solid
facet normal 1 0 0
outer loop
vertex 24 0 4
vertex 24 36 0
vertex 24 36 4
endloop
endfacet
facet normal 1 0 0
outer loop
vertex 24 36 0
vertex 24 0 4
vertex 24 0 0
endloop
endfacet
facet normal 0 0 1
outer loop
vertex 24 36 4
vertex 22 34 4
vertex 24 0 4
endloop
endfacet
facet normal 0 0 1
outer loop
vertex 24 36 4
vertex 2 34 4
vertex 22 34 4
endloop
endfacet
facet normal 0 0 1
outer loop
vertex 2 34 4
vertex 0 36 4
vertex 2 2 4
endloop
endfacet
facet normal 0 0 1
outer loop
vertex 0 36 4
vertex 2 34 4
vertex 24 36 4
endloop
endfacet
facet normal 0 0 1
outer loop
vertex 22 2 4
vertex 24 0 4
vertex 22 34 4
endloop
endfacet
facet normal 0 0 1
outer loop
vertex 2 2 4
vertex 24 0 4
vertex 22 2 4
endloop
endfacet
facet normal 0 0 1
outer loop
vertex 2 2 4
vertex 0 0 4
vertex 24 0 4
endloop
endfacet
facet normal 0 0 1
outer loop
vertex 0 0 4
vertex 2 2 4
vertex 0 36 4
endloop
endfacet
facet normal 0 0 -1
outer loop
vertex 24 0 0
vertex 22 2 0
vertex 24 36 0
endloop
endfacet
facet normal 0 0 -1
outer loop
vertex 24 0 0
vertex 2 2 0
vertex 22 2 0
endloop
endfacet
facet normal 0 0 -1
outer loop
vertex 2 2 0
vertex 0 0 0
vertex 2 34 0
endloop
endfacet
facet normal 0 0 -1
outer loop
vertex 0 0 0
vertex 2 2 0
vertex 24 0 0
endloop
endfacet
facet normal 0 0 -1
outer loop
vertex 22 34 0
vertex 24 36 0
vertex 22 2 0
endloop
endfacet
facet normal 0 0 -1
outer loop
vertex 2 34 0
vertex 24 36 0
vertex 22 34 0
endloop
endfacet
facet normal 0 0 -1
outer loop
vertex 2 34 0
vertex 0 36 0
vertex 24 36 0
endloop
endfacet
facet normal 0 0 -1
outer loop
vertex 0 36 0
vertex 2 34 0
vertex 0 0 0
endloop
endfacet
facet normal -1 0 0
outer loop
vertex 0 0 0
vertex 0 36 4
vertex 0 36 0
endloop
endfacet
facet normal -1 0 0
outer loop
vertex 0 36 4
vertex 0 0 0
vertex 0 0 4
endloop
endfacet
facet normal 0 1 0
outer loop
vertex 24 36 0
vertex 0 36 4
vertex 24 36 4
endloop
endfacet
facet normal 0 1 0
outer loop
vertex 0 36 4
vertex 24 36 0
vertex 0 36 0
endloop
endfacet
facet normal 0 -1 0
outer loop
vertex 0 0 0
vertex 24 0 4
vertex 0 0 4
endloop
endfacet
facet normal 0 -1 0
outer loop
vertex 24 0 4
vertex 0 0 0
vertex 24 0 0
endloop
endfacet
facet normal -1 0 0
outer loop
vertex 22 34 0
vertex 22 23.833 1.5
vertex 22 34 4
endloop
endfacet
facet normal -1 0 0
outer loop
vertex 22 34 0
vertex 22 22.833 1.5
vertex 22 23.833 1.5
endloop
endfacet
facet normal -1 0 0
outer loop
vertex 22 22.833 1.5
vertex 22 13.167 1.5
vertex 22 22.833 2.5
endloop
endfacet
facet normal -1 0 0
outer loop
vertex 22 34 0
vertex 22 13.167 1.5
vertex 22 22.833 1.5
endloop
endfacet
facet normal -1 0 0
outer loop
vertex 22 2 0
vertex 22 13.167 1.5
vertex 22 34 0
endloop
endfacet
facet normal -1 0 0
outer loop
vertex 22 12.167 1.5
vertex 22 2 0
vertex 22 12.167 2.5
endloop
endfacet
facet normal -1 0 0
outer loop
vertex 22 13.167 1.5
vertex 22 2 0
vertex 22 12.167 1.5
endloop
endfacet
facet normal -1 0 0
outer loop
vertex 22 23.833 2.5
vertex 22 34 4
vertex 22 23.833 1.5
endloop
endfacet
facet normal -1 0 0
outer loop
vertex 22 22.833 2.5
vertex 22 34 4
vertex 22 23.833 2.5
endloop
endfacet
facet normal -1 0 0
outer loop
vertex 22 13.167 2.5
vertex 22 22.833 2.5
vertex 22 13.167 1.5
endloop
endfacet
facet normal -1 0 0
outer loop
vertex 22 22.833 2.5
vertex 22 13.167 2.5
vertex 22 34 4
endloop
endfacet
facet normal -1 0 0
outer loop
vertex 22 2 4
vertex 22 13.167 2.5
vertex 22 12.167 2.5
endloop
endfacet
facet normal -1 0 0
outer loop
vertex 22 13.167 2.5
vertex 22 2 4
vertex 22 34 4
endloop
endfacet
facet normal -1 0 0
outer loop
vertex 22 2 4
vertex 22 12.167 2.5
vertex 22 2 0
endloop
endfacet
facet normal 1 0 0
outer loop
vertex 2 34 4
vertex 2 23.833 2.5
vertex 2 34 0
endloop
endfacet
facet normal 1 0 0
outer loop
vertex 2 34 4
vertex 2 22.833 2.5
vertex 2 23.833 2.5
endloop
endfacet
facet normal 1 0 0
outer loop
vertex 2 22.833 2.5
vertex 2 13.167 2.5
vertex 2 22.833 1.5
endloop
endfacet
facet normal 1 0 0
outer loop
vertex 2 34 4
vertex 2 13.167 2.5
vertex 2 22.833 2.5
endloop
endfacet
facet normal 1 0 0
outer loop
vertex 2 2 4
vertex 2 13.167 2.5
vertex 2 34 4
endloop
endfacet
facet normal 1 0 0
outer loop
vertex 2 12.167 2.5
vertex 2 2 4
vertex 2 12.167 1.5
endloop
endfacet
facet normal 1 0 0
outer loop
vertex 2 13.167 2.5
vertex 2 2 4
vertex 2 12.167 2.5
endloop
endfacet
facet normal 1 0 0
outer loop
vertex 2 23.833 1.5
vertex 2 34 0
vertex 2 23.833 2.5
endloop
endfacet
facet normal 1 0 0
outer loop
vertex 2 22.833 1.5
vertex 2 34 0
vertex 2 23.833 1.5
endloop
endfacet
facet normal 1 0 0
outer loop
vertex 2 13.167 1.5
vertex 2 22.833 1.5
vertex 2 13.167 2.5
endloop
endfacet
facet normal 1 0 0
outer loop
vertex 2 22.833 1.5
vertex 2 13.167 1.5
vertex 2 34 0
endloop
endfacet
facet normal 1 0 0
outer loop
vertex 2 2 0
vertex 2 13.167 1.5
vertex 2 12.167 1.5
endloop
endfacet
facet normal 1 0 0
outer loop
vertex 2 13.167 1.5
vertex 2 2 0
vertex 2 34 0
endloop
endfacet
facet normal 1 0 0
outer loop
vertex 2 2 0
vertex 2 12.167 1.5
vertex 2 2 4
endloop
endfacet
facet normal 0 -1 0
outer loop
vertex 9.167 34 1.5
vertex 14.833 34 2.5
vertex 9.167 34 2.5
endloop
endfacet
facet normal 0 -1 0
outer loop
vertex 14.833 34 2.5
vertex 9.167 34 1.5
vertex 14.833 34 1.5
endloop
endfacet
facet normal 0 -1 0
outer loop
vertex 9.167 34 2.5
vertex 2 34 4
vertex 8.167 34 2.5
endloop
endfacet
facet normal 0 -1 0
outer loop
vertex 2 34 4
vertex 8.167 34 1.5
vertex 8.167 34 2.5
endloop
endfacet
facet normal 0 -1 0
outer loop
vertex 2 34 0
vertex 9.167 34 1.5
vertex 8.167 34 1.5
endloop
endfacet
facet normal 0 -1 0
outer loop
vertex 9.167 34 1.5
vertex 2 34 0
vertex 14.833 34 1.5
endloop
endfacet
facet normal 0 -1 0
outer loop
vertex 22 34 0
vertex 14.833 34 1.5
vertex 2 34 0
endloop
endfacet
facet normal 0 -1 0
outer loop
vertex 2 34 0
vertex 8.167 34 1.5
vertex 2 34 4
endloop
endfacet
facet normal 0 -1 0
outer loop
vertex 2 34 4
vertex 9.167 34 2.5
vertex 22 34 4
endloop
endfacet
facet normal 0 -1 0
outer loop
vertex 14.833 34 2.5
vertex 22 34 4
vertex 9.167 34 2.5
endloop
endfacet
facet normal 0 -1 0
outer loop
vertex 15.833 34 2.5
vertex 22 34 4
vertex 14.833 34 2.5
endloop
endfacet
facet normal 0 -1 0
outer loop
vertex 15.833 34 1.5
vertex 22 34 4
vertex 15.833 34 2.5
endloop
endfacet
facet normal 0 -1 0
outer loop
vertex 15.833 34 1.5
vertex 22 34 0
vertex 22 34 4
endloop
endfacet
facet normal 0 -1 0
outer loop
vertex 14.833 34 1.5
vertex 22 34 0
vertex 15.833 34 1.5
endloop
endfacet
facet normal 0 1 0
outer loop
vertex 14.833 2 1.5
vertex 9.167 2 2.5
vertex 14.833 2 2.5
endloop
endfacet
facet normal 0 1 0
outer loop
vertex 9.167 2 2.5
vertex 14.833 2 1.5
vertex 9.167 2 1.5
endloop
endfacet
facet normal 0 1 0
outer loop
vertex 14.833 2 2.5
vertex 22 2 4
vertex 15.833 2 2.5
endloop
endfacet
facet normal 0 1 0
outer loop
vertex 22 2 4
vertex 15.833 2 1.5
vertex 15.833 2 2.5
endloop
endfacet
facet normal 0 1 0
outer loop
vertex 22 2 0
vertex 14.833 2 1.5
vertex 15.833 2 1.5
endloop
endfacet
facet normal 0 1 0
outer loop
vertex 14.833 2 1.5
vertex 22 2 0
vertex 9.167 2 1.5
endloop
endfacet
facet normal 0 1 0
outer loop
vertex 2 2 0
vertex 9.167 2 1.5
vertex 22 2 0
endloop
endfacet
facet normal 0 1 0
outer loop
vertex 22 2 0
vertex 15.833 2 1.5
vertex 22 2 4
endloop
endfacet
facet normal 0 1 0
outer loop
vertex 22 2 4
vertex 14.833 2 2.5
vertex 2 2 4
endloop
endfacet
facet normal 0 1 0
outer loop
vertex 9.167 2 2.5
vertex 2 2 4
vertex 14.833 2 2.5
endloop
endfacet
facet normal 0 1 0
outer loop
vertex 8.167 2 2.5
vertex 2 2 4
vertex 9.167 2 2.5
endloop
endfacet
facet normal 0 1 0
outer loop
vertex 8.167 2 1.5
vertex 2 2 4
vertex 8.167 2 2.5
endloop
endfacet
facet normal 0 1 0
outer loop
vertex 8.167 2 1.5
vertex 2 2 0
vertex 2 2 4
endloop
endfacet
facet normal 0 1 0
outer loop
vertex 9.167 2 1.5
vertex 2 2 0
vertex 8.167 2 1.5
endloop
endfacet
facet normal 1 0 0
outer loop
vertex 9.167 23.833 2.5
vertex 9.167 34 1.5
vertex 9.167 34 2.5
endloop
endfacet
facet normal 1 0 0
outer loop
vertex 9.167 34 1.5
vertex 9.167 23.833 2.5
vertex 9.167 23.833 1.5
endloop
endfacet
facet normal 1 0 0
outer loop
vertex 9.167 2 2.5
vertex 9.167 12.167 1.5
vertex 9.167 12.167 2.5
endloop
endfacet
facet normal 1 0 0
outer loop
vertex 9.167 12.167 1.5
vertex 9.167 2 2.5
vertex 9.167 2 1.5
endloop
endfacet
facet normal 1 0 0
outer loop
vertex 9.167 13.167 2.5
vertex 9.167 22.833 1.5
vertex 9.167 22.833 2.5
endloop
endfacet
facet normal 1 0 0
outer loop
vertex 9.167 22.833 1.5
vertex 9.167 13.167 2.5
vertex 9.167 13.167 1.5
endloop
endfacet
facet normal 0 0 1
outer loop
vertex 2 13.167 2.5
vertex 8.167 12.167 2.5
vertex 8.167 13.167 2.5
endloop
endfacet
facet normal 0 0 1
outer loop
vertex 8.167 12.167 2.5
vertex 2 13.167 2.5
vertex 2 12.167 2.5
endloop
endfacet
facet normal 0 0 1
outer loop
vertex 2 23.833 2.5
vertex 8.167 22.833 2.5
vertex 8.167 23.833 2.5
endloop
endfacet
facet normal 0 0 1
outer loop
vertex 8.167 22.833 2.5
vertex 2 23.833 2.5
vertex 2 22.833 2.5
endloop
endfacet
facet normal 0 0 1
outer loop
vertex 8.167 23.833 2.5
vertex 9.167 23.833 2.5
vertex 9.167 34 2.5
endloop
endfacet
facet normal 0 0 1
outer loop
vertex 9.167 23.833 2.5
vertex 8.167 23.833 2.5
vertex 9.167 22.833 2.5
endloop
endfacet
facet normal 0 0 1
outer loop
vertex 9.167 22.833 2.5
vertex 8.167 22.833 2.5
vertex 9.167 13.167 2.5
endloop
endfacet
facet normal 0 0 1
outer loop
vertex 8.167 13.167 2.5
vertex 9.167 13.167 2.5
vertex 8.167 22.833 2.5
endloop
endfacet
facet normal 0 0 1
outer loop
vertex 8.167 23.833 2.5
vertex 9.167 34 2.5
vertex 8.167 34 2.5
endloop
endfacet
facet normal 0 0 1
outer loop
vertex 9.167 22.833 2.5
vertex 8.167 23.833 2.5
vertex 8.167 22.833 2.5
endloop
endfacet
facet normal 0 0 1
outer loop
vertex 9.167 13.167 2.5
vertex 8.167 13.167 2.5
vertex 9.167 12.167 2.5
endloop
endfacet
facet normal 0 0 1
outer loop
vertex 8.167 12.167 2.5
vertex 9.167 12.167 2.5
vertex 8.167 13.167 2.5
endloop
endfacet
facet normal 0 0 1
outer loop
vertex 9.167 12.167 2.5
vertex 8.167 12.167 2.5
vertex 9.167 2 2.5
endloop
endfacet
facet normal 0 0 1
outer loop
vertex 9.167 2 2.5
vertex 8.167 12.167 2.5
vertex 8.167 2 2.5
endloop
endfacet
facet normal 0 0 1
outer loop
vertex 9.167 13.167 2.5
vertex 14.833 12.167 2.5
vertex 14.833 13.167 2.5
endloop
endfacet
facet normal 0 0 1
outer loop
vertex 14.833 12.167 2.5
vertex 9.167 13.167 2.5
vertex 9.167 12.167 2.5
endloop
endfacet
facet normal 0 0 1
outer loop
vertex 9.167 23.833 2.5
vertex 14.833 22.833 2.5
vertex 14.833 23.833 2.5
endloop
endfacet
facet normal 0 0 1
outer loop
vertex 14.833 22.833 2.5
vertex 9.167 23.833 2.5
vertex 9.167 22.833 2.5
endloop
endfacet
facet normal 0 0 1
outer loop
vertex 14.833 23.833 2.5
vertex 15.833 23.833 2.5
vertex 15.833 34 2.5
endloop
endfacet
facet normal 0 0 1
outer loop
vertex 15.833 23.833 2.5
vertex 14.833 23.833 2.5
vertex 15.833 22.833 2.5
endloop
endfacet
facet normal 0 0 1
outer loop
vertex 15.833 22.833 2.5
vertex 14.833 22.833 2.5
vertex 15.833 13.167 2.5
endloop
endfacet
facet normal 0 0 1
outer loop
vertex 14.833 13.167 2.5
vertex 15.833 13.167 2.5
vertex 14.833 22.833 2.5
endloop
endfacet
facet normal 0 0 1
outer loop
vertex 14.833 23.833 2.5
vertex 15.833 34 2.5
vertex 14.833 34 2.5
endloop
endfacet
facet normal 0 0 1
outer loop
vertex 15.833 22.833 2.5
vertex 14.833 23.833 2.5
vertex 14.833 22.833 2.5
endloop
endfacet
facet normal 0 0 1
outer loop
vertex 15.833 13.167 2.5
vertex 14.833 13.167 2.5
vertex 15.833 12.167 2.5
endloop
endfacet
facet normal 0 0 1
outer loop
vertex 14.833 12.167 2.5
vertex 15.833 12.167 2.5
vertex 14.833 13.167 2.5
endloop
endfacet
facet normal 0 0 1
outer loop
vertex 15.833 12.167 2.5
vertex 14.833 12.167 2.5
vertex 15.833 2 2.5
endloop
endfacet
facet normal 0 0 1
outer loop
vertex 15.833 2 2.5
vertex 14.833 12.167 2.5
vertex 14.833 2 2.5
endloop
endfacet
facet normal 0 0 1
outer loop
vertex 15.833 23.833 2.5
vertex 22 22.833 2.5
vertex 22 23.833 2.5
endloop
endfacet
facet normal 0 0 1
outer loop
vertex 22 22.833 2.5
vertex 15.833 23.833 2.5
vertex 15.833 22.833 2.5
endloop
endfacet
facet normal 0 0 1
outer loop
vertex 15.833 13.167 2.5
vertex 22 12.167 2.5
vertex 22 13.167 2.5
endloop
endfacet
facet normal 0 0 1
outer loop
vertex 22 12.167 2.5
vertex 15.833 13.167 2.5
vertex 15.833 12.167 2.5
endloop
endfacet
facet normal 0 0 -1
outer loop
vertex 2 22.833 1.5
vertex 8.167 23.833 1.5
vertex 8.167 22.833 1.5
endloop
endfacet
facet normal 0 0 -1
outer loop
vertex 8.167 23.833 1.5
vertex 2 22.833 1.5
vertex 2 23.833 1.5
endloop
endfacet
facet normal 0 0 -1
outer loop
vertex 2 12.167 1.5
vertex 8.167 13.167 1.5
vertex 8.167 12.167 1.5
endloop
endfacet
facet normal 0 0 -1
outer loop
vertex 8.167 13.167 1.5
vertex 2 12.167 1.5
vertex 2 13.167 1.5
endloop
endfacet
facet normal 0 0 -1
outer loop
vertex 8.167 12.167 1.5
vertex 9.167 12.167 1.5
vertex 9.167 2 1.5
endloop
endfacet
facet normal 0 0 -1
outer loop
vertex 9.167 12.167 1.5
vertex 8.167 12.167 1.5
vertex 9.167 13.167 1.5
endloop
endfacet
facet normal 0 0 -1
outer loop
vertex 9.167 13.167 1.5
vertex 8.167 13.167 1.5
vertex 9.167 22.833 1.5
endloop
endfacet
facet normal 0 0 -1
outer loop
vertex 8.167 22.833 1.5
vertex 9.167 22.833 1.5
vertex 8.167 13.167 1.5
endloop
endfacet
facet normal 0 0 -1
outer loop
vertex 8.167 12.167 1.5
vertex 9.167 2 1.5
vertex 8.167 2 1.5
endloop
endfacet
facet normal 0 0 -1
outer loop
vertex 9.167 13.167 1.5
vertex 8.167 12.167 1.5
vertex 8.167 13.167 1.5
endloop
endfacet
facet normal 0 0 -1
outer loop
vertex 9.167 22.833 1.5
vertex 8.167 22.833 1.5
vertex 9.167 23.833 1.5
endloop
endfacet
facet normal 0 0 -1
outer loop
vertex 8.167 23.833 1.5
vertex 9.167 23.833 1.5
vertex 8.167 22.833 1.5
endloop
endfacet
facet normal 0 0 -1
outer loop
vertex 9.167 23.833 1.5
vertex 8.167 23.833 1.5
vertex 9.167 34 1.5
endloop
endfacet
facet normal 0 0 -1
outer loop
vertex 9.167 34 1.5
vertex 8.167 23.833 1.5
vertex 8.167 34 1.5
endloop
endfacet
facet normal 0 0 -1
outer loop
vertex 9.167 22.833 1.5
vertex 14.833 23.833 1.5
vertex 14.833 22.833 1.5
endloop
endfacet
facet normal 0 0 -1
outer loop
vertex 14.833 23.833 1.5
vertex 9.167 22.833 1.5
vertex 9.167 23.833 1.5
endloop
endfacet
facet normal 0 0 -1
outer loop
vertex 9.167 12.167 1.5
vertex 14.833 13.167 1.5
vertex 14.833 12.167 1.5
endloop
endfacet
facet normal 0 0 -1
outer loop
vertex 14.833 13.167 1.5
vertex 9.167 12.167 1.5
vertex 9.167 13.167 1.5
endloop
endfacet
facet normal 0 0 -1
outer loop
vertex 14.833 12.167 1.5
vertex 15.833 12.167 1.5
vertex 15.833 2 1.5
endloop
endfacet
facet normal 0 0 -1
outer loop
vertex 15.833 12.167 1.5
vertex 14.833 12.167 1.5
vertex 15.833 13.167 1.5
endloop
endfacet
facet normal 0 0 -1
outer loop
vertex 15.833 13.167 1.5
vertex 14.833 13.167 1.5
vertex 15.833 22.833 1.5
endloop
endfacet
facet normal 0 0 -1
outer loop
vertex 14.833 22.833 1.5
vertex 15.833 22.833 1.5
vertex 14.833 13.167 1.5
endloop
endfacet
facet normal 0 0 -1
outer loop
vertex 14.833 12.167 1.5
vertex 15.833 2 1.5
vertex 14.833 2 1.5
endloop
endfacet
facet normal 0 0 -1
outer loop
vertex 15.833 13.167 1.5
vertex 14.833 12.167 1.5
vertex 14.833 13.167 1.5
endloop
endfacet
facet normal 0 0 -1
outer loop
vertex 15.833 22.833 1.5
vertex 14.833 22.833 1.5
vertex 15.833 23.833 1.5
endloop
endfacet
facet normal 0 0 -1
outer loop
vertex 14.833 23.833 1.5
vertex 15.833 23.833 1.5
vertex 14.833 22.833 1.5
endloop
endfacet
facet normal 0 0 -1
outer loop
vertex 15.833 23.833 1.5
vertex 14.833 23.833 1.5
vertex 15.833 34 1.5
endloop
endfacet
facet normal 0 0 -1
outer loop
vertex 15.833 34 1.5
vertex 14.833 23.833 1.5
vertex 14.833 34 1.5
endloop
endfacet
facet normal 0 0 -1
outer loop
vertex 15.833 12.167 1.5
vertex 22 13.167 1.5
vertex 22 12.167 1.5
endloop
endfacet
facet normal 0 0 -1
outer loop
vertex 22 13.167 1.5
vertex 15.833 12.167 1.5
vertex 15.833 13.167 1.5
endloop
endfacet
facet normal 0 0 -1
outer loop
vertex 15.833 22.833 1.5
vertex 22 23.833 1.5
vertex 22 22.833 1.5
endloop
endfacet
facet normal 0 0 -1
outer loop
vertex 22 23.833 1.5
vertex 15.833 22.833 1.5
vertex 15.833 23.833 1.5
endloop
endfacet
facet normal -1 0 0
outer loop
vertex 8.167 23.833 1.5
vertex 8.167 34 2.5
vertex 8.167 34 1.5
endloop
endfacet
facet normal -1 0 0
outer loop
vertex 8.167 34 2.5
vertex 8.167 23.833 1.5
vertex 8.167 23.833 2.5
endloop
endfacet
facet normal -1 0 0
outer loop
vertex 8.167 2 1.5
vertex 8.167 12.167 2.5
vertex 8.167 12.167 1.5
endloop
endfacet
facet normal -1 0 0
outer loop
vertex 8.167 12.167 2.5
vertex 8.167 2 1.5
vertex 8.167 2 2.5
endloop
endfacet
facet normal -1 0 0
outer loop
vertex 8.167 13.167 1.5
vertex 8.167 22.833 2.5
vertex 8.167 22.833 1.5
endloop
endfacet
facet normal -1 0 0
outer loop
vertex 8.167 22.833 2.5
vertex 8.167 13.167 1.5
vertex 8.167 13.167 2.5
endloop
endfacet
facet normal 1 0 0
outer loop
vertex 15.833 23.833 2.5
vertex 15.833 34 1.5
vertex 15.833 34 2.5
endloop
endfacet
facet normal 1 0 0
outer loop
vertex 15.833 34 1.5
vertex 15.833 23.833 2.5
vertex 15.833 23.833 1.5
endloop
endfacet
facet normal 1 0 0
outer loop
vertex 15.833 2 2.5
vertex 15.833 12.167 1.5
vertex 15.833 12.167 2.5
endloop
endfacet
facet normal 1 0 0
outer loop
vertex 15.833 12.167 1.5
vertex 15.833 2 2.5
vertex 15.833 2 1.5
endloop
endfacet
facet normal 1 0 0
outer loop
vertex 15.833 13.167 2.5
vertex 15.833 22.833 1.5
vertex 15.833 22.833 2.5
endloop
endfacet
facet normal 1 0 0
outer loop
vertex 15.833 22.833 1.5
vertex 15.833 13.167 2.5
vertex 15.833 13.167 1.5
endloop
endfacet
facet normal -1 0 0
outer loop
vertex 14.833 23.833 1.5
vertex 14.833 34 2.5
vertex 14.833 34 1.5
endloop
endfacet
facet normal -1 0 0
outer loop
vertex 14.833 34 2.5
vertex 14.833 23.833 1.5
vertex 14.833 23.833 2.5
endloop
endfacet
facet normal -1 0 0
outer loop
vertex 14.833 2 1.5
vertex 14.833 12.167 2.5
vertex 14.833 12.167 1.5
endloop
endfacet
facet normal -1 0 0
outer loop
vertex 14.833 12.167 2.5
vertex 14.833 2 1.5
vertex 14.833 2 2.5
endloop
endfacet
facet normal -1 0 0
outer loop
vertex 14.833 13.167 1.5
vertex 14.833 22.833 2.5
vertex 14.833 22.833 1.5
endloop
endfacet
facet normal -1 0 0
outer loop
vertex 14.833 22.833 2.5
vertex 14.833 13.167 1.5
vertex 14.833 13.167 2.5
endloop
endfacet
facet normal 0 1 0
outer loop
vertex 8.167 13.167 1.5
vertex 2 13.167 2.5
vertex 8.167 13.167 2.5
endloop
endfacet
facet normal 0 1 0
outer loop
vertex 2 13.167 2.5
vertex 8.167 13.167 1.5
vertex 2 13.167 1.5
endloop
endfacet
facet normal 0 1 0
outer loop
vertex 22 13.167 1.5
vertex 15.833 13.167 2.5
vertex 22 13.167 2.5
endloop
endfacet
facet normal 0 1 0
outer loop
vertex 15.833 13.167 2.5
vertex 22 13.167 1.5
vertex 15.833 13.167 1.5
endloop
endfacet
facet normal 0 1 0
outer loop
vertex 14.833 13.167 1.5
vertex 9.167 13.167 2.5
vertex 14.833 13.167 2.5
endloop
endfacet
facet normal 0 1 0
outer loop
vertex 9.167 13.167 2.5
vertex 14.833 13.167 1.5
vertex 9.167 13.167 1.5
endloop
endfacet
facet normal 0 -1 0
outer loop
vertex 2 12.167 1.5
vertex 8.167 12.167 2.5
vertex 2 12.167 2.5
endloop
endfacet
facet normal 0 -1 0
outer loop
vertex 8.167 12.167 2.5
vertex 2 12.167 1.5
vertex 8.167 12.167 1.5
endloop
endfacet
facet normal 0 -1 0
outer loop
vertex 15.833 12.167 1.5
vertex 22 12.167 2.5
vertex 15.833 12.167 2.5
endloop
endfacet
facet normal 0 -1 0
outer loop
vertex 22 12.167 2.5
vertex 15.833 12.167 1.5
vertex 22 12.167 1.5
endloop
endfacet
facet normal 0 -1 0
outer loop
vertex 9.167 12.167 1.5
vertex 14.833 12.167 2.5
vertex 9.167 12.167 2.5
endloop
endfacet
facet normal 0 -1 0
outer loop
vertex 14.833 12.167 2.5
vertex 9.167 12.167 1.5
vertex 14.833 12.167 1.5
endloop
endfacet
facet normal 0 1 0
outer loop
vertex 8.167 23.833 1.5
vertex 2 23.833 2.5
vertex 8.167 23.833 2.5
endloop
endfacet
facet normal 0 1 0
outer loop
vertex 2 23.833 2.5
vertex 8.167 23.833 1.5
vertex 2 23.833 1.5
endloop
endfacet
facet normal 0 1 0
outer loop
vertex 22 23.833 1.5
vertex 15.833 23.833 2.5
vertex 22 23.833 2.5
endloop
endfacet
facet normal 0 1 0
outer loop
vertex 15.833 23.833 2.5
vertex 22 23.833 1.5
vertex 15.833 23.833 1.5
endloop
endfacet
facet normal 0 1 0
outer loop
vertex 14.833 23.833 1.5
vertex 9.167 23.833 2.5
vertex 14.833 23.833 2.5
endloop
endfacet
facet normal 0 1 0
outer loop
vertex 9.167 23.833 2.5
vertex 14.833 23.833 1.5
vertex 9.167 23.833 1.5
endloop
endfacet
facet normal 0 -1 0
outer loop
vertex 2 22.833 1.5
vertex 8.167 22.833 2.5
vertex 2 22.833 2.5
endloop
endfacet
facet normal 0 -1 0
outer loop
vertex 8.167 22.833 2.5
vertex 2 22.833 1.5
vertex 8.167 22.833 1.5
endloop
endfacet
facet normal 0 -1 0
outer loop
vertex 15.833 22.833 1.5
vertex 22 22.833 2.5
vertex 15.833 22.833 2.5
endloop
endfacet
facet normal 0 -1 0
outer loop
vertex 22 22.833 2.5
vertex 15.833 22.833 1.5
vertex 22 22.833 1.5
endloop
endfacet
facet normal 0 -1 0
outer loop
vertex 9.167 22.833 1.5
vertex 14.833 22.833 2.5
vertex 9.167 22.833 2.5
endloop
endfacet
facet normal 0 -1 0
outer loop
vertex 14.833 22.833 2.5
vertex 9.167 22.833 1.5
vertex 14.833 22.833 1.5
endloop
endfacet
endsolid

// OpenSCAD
module grill(offset, size, count) {
  if (count > 1) {
    translate(offset) cube(size, true);
    translate(offset) grill(offset, size, count - 1);
  }
} 

module Sash(
  // These parameters are required
  width,  // The total outside width of the window (including the casing.)
  height, // the total outside height of the window (including the apron and head)
  depth, // The total depth of the window, including the jamb
  rail_width, //the height of the top and bottom rail(s)
  grill_width, // the width of the grill
  pane_cols, // how many panes (horizontal)
  pane_rows, // how many panes (vertical)
) {
  assert(width, "Must provide a window width");
  assert(height, "Must provide a window height");
  assert(depth, "Must provide a window depth");
  assert(rail_width, "Must provide a rail width");
  assert(grill_width, "Must provide a grill width");
  assert(pane_cols, "Must provide the number of pane cols");
  assert(pane_rows, "must provide the number of pane rows");

  inner_width=(width-2*rail_width);
  inner_height=(height-2*rail_width);

  union() {
    difference() {
      cube([width,height,depth], false);
      translate([rail_width,rail_width,-1]) cube([inner_width, inner_height, depth+2], false);
    };

    // draw vertical sashes
    translate([rail_width, inner_height/2 + rail_width, depth/2]) grill(
      offset=[inner_width/pane_cols, 0, 0],
      size=[grill_width, inner_height, grill_width], 
      count=pane_cols
    );

    // draw horizontal sashes
    translate([inner_width/2 + rail_width, rail_width, depth/2]) grill(
      offset=[0, inner_height/pane_rows, 0],
      size=[inner_width, grill_width, grill_width], 
      count=pane_rows
    );
  }
}

Sash(width=24,height=36,depth=4,rail_width=2,grill_width=1,pane_cols=3,pane_rows=3);
